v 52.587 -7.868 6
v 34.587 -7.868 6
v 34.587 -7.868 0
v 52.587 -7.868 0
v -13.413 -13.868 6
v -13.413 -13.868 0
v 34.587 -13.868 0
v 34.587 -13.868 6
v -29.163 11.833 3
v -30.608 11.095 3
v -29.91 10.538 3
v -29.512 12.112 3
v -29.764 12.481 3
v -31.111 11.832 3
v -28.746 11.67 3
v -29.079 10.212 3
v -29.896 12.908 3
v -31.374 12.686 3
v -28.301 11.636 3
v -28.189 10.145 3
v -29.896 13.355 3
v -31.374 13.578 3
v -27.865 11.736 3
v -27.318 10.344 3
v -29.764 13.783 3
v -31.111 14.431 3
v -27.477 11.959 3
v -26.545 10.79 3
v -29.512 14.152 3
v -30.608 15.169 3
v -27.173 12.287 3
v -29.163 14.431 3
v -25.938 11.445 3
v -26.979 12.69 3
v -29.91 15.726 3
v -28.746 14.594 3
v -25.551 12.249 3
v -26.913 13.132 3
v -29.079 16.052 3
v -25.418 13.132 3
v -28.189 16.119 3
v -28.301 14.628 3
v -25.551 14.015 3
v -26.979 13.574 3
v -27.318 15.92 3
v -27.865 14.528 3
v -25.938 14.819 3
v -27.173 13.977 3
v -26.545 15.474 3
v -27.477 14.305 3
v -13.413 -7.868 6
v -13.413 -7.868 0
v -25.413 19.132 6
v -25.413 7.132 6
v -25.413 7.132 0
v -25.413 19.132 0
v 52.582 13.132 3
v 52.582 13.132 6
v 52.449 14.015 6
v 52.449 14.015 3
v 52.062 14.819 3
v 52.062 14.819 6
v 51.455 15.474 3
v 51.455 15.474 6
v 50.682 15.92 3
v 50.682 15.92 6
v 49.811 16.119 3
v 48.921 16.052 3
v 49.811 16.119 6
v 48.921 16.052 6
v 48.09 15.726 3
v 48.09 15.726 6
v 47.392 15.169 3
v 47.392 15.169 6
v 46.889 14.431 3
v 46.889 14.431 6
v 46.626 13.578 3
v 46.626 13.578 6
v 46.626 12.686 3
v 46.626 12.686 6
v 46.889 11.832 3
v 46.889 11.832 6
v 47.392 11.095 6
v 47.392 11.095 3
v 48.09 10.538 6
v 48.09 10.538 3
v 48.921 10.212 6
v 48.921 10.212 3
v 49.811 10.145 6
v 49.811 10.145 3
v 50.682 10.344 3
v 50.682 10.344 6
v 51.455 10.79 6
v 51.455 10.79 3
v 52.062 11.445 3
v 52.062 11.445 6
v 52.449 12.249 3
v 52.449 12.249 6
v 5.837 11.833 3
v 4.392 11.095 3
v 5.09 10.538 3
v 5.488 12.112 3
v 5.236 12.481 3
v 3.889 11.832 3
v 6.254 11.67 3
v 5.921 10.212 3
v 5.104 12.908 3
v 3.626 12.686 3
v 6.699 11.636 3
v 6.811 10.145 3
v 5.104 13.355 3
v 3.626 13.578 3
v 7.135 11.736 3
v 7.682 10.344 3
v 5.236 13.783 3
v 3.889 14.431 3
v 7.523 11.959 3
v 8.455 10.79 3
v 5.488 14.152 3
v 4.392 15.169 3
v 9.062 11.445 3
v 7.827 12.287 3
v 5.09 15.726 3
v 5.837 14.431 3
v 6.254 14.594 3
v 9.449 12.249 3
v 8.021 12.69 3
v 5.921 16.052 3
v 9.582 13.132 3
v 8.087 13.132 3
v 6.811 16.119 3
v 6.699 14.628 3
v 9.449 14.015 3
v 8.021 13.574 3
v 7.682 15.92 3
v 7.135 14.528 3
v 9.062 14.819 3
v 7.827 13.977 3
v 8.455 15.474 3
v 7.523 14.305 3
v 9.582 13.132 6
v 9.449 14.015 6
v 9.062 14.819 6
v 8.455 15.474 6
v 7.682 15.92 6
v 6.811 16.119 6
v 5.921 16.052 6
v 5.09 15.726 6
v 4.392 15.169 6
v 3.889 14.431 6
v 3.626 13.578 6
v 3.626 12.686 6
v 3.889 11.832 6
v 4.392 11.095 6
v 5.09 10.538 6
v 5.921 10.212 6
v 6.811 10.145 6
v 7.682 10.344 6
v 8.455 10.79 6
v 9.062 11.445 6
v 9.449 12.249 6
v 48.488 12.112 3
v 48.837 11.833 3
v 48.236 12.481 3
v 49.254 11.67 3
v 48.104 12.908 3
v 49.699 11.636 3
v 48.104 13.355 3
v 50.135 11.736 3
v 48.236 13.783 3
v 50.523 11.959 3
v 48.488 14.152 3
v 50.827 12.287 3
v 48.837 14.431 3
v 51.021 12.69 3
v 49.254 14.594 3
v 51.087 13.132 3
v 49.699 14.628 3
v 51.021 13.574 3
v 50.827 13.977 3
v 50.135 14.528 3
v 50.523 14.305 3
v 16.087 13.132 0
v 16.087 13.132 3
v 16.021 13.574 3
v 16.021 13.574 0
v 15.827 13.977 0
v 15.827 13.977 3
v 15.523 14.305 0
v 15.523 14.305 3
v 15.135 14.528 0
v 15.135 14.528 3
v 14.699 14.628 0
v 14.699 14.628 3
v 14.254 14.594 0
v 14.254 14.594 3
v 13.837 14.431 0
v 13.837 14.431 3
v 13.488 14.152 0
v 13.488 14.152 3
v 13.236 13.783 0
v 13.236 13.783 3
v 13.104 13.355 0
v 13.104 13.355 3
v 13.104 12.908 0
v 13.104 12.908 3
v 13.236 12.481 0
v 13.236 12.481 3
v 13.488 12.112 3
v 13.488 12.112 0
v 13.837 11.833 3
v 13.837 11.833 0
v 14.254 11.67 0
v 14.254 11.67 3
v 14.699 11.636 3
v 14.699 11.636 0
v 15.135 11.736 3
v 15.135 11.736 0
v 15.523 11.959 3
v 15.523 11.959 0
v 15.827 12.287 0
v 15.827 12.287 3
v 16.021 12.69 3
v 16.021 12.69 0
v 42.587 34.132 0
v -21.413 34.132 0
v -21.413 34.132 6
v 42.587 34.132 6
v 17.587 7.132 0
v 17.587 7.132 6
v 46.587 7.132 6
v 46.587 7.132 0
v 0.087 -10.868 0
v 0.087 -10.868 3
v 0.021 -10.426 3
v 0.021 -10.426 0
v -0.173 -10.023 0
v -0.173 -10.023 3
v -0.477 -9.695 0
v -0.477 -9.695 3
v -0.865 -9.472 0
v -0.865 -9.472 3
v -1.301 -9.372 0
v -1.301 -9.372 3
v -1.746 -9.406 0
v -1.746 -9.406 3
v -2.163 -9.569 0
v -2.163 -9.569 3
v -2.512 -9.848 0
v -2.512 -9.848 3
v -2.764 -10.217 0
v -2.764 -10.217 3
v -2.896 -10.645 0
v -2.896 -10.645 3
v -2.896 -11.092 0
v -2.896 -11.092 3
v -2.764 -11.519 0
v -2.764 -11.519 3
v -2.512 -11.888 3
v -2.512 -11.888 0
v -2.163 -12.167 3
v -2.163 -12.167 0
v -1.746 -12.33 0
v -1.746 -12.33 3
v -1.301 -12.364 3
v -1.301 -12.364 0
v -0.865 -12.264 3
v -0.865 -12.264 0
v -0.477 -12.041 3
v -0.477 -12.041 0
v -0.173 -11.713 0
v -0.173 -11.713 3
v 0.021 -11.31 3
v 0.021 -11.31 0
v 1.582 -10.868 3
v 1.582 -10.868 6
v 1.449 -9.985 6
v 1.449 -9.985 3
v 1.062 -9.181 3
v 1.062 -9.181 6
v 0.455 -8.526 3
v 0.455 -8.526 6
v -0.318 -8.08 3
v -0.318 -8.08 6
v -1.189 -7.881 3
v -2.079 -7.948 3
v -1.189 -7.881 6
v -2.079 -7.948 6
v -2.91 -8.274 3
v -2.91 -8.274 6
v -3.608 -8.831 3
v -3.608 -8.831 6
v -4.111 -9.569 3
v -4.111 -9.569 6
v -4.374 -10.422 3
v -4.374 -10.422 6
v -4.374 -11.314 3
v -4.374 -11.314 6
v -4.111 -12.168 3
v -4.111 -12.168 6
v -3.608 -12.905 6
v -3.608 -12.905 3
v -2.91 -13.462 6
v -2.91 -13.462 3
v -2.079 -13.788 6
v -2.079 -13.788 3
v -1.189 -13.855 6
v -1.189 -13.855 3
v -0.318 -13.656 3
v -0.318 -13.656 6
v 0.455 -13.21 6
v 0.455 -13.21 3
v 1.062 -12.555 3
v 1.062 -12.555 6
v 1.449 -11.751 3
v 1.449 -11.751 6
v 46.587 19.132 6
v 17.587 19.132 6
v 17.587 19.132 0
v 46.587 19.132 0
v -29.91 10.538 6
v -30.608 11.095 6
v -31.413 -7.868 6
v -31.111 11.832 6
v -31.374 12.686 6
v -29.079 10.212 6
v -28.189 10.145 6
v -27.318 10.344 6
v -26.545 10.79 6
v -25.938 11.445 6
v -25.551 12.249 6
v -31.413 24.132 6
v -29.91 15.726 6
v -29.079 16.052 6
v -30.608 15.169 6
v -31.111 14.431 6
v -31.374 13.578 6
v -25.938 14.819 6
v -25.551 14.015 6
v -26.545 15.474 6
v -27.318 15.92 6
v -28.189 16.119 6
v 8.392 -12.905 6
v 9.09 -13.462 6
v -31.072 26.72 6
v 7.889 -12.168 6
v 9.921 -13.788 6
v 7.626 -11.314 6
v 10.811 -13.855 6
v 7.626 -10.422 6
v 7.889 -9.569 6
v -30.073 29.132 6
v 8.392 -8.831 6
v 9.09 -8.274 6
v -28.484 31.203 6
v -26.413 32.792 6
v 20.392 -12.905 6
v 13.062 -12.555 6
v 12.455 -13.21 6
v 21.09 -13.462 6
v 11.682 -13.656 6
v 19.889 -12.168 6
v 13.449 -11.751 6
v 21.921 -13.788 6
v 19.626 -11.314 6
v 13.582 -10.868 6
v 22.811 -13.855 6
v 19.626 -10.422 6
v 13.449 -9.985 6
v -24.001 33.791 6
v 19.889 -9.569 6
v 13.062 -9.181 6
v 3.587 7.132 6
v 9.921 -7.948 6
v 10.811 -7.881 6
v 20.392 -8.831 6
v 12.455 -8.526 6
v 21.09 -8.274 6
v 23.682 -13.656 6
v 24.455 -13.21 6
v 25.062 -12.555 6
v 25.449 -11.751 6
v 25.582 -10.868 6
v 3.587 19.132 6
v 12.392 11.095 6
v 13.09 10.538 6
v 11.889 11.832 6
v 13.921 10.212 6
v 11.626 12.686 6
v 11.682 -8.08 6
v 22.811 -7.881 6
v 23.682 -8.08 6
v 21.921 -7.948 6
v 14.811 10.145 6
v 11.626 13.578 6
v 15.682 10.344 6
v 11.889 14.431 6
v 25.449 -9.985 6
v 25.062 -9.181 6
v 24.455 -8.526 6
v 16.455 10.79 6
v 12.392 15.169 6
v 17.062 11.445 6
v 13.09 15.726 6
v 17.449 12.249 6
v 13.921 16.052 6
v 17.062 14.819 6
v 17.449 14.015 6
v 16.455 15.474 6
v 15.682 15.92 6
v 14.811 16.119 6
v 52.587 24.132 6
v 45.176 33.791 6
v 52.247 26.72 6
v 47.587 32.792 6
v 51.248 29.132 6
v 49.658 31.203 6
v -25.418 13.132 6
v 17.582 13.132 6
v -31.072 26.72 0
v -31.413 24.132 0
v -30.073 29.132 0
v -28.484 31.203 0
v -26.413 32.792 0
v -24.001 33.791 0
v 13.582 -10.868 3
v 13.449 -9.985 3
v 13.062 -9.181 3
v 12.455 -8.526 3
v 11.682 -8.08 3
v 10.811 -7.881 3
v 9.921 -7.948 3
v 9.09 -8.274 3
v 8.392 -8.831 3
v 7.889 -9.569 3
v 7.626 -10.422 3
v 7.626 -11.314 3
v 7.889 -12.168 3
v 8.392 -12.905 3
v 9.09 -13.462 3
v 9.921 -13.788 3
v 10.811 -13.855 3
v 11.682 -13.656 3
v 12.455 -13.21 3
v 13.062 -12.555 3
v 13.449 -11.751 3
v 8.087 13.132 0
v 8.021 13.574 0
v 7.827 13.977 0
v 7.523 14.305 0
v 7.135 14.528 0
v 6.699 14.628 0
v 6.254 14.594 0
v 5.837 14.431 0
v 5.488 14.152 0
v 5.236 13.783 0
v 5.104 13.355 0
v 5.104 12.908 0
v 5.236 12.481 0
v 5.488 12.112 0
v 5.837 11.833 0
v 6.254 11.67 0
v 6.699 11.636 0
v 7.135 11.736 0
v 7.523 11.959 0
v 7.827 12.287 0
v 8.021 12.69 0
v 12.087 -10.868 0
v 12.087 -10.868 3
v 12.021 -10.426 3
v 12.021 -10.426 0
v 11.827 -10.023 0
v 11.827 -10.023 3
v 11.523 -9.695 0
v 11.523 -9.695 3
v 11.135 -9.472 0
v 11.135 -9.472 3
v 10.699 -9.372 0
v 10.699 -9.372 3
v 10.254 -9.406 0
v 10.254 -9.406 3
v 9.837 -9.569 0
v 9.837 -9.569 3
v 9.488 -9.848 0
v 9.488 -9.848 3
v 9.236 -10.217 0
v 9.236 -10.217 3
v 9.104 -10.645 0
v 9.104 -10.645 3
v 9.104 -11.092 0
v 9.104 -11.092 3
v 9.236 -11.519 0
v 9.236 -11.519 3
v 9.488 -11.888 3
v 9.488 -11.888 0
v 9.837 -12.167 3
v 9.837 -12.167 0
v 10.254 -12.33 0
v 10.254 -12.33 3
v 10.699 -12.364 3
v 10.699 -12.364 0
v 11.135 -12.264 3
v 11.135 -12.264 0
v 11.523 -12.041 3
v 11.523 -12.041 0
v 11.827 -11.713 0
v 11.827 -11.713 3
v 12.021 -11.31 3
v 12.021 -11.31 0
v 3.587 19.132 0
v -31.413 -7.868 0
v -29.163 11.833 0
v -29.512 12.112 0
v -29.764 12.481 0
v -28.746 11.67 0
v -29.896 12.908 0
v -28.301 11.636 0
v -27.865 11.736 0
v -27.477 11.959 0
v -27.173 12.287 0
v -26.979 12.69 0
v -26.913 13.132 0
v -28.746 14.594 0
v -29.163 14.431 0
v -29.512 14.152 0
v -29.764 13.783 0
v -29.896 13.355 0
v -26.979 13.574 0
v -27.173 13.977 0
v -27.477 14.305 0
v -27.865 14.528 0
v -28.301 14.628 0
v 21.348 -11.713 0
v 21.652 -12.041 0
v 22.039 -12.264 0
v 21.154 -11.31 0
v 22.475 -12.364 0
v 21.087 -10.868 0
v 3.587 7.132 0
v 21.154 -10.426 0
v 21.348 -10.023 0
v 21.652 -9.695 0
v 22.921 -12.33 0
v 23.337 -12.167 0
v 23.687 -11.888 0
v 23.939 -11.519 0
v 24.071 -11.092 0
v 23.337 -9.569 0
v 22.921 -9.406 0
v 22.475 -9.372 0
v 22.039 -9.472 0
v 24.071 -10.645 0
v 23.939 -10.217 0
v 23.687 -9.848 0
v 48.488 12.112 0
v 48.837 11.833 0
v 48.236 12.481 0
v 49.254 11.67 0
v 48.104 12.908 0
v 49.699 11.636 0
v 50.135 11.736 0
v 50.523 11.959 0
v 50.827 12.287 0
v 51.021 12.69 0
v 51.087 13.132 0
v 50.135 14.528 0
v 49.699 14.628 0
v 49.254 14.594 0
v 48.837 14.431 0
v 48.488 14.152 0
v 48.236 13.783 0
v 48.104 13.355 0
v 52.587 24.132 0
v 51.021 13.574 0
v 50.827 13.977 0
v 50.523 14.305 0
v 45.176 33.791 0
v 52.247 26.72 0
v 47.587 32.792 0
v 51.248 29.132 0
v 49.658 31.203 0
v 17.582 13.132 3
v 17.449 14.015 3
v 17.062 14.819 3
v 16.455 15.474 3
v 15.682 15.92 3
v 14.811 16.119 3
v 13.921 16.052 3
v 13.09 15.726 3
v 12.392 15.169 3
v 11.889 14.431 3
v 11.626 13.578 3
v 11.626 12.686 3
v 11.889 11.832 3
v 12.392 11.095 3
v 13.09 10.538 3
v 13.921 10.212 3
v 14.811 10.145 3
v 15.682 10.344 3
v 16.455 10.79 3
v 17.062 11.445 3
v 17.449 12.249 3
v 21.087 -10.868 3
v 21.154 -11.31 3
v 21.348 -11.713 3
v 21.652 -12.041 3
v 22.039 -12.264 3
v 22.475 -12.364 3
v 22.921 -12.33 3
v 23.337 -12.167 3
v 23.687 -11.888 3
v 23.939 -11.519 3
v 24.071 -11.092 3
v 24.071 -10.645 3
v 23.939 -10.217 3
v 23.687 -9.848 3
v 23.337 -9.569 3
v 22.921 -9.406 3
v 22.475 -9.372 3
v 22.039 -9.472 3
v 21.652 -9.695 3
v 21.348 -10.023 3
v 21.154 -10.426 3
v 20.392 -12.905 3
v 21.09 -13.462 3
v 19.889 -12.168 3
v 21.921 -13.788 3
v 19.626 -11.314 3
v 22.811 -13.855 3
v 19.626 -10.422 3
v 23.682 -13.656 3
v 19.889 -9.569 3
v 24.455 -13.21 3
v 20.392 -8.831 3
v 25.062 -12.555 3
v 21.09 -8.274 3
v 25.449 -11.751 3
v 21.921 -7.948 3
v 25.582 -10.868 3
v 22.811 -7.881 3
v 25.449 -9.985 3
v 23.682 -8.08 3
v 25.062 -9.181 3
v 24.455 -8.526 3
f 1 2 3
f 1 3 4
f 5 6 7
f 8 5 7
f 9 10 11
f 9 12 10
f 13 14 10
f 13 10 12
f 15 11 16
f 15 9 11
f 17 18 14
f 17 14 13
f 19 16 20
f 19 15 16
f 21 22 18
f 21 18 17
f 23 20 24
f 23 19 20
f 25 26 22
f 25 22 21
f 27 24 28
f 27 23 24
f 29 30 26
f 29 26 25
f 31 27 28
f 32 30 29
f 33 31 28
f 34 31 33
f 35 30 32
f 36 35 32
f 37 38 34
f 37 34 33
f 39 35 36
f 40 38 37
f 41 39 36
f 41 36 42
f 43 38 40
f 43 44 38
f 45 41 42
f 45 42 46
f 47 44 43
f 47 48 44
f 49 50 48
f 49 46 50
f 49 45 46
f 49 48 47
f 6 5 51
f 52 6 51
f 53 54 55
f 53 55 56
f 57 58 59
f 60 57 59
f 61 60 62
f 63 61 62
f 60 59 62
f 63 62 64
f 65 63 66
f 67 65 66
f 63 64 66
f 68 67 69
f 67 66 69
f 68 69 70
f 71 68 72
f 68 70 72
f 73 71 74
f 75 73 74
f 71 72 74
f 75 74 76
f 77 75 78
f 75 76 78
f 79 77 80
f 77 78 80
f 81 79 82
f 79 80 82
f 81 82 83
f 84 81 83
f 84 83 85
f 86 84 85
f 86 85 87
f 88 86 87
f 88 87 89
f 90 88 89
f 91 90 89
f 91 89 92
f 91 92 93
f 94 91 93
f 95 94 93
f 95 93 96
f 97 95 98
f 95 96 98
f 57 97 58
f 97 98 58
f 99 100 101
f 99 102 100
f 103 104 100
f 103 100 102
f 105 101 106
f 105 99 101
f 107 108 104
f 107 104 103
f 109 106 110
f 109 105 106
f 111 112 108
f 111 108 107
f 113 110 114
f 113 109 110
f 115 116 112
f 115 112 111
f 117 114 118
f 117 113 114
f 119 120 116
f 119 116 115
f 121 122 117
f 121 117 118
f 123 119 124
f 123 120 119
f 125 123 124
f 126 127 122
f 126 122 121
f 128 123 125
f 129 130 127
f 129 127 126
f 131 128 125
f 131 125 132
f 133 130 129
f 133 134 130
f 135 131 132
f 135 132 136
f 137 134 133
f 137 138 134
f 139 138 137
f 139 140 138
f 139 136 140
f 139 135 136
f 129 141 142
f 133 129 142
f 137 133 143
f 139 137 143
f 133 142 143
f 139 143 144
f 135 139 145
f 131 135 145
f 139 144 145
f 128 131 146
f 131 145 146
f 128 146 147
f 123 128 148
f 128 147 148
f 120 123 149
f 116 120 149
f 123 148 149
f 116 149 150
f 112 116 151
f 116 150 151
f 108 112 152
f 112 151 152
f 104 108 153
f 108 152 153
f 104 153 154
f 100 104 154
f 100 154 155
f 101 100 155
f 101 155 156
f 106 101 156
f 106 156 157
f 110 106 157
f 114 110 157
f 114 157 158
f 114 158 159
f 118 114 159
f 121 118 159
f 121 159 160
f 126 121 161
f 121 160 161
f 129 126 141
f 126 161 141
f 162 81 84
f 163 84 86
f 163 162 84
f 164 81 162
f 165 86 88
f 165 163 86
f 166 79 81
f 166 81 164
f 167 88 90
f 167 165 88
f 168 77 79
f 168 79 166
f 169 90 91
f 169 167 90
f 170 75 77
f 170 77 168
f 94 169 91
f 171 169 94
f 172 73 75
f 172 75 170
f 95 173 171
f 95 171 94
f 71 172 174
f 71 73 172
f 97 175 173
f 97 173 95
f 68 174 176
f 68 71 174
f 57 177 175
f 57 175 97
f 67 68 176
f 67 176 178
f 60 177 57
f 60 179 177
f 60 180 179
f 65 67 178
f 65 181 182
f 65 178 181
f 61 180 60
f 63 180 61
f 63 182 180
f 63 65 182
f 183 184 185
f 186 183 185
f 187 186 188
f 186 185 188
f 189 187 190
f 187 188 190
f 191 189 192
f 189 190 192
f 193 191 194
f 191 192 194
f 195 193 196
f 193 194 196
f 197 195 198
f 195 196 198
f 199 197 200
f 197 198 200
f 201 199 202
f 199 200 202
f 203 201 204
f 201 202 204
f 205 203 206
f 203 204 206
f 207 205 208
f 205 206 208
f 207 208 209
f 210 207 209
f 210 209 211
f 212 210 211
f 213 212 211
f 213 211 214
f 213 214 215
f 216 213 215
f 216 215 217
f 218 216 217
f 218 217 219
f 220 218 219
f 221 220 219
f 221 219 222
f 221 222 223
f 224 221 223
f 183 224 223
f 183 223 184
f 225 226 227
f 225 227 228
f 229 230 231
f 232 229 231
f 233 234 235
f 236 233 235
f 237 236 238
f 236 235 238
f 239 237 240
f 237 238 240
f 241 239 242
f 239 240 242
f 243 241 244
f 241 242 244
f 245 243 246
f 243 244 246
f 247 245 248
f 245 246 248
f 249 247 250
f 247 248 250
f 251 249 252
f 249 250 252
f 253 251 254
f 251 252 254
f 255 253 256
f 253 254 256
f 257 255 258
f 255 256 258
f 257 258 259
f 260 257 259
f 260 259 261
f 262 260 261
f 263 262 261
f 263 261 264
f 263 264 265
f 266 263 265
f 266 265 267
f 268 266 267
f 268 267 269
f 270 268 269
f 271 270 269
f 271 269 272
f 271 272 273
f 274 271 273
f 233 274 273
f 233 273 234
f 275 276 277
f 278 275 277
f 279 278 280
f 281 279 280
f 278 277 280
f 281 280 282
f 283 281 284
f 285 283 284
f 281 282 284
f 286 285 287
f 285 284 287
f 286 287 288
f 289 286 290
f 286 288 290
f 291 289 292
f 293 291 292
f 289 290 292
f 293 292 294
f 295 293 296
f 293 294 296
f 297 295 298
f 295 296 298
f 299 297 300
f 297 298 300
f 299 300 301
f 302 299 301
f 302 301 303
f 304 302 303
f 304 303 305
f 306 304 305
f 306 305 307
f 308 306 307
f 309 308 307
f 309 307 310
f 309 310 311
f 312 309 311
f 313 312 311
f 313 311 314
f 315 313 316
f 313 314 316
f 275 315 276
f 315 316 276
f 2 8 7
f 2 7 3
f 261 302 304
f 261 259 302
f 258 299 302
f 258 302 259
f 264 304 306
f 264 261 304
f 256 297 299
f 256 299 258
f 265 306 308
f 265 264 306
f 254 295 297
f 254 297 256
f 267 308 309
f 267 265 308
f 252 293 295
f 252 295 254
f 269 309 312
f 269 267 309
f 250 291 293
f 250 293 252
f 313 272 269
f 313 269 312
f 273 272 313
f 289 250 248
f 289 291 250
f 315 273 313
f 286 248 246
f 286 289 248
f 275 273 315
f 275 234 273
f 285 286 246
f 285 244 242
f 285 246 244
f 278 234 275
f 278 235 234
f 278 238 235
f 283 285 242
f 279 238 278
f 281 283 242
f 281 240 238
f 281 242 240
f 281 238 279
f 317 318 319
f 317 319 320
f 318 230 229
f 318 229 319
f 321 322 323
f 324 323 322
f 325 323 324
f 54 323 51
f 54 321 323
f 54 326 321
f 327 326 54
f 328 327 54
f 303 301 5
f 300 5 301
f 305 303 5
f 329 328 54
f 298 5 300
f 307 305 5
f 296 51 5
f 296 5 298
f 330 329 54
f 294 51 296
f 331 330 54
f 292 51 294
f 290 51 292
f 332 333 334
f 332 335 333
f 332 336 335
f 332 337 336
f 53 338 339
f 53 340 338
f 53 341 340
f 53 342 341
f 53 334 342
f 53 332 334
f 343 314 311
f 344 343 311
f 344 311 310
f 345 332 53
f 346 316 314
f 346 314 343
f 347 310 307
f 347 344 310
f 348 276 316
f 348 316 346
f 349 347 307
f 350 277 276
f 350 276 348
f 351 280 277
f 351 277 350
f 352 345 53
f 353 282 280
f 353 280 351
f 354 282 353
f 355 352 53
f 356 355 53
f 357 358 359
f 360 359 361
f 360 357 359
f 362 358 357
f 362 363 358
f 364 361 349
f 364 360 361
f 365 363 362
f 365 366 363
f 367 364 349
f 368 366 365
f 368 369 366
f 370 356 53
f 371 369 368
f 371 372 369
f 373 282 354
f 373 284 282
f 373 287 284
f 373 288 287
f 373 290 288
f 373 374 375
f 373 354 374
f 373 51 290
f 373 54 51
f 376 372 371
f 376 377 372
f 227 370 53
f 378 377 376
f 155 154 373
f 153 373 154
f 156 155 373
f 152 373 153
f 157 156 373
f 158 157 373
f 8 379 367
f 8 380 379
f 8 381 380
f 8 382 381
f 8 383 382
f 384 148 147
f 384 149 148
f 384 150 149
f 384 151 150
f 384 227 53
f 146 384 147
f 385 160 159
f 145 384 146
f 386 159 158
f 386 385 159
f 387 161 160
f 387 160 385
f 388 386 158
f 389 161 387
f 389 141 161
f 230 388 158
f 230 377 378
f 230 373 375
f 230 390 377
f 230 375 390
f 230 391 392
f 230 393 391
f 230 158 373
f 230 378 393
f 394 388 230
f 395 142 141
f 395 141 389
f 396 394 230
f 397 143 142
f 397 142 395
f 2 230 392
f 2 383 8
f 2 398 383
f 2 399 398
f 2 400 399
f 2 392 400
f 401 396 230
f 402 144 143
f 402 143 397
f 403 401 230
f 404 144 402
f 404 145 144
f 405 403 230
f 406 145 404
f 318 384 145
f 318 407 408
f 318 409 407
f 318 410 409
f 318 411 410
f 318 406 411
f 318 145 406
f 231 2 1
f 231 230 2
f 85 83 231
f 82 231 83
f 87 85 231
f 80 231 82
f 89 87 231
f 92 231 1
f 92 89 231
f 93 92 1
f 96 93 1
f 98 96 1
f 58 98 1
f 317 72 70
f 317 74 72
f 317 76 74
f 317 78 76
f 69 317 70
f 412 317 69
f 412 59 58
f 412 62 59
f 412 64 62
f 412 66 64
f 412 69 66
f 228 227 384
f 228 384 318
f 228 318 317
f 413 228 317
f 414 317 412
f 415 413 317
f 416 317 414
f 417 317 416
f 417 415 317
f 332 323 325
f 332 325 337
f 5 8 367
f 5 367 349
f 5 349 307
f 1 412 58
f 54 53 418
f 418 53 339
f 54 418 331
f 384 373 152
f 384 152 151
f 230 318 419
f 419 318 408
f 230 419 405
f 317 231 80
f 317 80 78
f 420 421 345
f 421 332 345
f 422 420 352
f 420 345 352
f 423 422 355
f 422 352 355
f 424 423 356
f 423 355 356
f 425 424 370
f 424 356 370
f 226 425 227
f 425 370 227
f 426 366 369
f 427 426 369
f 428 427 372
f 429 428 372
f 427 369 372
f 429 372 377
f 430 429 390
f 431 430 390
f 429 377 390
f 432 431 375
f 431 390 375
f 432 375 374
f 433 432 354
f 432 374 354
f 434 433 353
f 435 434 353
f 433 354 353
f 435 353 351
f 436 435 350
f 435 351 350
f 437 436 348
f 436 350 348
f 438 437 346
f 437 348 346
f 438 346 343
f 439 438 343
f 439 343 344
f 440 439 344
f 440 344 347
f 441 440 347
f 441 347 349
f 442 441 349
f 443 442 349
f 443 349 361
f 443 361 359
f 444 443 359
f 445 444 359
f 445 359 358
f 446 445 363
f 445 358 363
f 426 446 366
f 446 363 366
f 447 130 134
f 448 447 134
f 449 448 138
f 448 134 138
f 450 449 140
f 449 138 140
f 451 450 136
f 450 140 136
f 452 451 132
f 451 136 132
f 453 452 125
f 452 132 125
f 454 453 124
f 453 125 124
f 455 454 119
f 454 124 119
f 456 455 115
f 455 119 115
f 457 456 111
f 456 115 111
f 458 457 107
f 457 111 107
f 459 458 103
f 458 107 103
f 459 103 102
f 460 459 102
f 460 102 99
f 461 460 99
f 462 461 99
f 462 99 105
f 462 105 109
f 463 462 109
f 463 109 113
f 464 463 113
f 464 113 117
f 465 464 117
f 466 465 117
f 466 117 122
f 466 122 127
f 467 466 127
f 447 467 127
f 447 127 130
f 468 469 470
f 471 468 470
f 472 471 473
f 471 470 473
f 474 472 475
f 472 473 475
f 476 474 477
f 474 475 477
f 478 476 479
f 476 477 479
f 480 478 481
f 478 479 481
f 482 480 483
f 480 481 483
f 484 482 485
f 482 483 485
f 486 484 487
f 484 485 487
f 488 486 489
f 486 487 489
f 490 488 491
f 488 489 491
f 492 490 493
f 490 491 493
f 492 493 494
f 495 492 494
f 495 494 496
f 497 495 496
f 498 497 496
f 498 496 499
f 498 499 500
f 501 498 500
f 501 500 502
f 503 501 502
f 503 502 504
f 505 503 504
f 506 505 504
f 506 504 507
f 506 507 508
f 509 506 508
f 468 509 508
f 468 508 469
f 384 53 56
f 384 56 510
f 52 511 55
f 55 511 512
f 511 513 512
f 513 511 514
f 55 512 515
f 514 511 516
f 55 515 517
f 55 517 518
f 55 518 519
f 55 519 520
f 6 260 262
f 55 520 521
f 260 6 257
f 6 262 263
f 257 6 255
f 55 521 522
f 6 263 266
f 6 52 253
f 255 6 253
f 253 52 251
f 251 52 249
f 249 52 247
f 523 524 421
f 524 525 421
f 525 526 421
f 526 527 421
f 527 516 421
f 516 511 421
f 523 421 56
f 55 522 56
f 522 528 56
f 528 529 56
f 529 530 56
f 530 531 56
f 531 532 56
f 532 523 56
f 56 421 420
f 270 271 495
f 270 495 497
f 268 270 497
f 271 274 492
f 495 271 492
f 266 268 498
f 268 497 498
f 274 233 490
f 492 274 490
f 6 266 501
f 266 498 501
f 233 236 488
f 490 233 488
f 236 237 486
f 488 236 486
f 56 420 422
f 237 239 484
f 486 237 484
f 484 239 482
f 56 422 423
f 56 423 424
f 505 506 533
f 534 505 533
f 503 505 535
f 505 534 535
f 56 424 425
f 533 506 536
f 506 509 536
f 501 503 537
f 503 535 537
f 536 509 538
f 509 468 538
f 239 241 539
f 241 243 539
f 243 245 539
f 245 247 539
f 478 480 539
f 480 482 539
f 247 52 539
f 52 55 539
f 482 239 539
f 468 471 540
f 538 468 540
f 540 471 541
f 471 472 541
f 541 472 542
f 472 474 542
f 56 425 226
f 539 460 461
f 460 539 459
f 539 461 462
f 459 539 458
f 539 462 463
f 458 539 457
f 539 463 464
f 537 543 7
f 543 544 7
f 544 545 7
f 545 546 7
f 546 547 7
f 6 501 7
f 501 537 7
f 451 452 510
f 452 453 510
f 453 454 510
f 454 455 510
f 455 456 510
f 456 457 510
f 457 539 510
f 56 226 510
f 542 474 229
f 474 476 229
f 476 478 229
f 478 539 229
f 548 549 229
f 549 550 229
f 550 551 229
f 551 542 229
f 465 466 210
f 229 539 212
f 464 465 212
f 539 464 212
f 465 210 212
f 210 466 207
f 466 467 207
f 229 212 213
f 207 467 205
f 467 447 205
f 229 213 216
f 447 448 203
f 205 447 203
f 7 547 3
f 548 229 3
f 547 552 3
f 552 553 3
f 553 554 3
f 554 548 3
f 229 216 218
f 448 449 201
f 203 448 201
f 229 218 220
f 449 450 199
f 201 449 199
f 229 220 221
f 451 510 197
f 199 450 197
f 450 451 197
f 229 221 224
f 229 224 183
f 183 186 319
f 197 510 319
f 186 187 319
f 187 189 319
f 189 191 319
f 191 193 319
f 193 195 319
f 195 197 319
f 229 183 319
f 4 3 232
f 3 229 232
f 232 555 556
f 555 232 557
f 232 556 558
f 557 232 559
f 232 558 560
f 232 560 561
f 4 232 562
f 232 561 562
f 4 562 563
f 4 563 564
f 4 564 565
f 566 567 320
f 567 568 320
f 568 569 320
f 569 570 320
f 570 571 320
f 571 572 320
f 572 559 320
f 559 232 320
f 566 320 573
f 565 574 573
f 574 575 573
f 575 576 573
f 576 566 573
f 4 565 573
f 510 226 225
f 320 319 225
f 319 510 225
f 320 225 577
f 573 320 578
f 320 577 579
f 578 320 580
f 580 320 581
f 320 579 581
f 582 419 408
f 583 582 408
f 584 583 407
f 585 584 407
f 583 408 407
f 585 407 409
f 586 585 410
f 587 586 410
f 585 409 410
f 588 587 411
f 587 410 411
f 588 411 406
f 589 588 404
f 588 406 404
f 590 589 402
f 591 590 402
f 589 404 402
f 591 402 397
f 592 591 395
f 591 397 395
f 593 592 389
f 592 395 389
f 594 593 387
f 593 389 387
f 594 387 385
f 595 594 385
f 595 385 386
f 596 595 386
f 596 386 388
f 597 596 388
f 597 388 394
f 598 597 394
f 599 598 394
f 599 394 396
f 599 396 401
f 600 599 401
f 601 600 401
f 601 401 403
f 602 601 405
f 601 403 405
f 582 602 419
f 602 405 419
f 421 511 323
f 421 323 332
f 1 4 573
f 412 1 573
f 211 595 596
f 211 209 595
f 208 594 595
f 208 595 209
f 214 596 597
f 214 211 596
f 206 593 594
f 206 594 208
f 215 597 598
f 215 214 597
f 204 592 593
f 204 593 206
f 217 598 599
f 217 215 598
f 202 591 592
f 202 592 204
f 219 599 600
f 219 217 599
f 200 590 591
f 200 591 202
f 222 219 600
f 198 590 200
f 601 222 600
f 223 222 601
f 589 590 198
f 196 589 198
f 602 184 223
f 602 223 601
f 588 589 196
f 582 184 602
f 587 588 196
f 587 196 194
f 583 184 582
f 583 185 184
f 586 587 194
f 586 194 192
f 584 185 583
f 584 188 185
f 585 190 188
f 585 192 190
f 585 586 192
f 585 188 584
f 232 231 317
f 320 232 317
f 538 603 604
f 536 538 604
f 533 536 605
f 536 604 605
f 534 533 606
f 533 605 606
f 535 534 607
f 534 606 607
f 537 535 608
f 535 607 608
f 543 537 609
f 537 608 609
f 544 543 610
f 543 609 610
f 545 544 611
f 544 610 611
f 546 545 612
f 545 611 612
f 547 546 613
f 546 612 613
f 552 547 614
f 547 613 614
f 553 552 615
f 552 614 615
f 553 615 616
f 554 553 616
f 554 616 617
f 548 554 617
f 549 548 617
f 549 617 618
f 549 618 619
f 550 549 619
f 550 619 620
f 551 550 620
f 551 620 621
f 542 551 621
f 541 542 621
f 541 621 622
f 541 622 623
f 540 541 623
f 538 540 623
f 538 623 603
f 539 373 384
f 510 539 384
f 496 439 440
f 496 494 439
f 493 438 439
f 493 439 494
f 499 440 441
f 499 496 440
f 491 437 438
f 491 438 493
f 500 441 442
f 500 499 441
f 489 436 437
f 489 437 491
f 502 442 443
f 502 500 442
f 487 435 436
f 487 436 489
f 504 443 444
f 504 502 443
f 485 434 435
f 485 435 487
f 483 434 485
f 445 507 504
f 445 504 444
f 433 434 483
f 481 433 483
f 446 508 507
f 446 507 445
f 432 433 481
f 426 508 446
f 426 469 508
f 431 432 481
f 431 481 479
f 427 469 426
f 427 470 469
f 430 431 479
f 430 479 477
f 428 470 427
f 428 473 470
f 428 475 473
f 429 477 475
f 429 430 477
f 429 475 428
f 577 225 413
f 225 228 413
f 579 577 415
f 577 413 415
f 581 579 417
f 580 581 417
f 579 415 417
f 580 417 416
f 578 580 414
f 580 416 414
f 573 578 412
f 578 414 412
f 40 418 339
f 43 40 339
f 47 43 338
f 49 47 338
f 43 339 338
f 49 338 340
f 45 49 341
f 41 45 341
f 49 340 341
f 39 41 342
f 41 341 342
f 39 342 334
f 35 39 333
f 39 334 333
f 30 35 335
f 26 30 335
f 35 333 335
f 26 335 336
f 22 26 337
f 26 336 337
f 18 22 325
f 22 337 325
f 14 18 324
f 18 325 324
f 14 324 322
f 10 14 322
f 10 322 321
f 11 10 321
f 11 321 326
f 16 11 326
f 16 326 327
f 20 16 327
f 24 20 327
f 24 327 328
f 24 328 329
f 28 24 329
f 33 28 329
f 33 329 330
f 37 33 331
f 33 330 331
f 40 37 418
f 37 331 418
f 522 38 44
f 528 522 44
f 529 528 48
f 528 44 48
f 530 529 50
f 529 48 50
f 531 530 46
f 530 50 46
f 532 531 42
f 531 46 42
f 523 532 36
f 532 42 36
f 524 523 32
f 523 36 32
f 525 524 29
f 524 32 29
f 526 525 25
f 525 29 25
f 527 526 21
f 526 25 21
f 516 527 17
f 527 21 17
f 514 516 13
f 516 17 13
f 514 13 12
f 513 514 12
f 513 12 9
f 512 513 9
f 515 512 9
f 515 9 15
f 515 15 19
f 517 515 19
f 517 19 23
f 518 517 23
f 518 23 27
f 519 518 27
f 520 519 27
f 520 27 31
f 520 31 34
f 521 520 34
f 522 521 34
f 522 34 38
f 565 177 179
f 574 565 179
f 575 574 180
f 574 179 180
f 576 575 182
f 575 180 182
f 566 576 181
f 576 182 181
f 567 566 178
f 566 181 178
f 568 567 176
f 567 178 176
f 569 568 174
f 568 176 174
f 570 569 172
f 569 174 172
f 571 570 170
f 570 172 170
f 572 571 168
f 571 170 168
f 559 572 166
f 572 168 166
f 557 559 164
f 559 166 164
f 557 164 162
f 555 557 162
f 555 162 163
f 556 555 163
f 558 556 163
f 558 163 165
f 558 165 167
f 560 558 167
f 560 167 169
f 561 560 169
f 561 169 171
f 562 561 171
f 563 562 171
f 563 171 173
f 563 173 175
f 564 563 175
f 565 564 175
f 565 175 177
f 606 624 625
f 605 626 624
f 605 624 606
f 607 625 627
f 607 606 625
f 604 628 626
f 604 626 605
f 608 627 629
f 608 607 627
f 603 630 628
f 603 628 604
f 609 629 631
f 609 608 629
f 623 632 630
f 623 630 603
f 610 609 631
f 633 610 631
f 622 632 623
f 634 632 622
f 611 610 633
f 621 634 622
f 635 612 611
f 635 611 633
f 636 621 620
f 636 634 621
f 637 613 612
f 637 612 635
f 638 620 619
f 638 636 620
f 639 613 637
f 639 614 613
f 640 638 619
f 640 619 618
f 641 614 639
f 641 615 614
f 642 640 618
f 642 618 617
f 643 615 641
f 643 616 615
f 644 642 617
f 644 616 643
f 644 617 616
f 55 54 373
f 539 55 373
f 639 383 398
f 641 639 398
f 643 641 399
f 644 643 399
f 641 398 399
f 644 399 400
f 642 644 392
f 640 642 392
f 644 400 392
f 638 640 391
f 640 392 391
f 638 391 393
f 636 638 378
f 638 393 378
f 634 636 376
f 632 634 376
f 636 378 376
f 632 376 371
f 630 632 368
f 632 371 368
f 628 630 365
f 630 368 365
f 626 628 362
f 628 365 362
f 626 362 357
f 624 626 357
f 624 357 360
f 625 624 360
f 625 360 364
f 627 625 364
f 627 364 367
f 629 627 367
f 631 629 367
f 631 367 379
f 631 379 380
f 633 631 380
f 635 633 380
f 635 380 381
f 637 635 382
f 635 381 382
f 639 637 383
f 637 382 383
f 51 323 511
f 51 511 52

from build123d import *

# Parameters (mm, degrees)
ESQUISSE2_W             = 84
ESQUISSE2_H             = 48
BOSS_EXTRU_1_DEPTH      = 6
ESQUISSE3_R             = 1.5
ESQUISSE3_W             = 18
ESQUISSE3_H             = 6
ESQUISSE3_W_2           = 29
ESQUISSE3_H_2           = 12
ENL_V_MAT_EXTRU_1_DEPTH = 6
ESQUISSE4_R             = 2.995
ENL_V_MAT_EXTRU_2_DEPTH = 3
CONG_1_R                = 10


with BuildPart() as part:
    # Esquisse2 → Boss.-Extru.1 (new body)
    with BuildSketch(Plane.XY):
        with Locations((10.587382635, 10.131926121)):
            Rectangle(ESQUISSE2_W, ESQUISSE2_H)
    extrude(amount=BOSS_EXTRU_1_DEPTH)

    # Esquisse3 → Enlèv. mat.-Extru.1 (cut)
    with BuildSketch(Plane.XY.offset(6)):
        with Locations((-28.412617365, 13.131926121)):
            Circle(ESQUISSE3_R)
        with Locations((49.587382635, 13.131926121)):
            Circle(ESQUISSE3_R)
        with Locations((6.587382635, 13.131926121)):
            Circle(ESQUISSE3_R)
        with Locations((14.587382635, 13.131926121)):
            Circle(ESQUISSE3_R)
        with Locations((-1.412617365, -10.868073879)):
            Circle(ESQUISSE3_R)
        with Locations(Location((22.587382635, -10.868073879, 0), (0, 0, 180))):
            Circle(ESQUISSE3_R)
        with Locations((10.587382635, -10.868073879)):
            Circle(ESQUISSE3_R)
        with Locations((-22.412617365, -10.868073879)):
            Rectangle(ESQUISSE3_W, ESQUISSE3_H)
        with Locations((43.587382635, -10.868073879)):
            Rectangle(ESQUISSE3_W, ESQUISSE3_H)
        with Locations((-10.912617365, 13.131926121)):
            Rectangle(ESQUISSE3_W_2, ESQUISSE3_H_2)
        with Locations((32.087382635, 13.131926121)):
            Rectangle(ESQUISSE3_W_2, ESQUISSE3_H_2)
    extrude(amount=-ENL_V_MAT_EXTRU_1_DEPTH, mode=Mode.SUBTRACT)

    # Esquisse4 → Enlèv. mat.-Extru.2 (cut)
    with BuildSketch(Plane.XY.offset(6)):
        with Locations((-1.412617365, -10.868073879)):
            Circle(ESQUISSE4_R)
        with Locations((22.587382635, -10.868073879)):
            Circle(ESQUISSE4_R)
        with Locations((10.587382635, -10.868073879)):
            Circle(ESQUISSE4_R)
        with Locations((-28.412617365, 13.131926121)):
            Circle(ESQUISSE4_R)
        with Locations((6.587382635, 13.131926121)):
            Circle(ESQUISSE4_R)
        with Locations((14.587382635, 13.131926121)):
            Circle(ESQUISSE4_R)
        with Locations((49.587382635, 13.131926121)):
            Circle(ESQUISSE4_R)
    extrude(amount=-ENL_V_MAT_EXTRU_2_DEPTH, mode=Mode.SUBTRACT)

    # Congé1
    cong_1_edges = [part.edges().sort_by_distance(p)[0] for p in [
        (-31.412617365, 34.131926121, 3),
        (52.587382635, 34.131926121, 3),
    ]]
    fillet(cong_1_edges, radius=CONG_1_R)


solid = part.part
